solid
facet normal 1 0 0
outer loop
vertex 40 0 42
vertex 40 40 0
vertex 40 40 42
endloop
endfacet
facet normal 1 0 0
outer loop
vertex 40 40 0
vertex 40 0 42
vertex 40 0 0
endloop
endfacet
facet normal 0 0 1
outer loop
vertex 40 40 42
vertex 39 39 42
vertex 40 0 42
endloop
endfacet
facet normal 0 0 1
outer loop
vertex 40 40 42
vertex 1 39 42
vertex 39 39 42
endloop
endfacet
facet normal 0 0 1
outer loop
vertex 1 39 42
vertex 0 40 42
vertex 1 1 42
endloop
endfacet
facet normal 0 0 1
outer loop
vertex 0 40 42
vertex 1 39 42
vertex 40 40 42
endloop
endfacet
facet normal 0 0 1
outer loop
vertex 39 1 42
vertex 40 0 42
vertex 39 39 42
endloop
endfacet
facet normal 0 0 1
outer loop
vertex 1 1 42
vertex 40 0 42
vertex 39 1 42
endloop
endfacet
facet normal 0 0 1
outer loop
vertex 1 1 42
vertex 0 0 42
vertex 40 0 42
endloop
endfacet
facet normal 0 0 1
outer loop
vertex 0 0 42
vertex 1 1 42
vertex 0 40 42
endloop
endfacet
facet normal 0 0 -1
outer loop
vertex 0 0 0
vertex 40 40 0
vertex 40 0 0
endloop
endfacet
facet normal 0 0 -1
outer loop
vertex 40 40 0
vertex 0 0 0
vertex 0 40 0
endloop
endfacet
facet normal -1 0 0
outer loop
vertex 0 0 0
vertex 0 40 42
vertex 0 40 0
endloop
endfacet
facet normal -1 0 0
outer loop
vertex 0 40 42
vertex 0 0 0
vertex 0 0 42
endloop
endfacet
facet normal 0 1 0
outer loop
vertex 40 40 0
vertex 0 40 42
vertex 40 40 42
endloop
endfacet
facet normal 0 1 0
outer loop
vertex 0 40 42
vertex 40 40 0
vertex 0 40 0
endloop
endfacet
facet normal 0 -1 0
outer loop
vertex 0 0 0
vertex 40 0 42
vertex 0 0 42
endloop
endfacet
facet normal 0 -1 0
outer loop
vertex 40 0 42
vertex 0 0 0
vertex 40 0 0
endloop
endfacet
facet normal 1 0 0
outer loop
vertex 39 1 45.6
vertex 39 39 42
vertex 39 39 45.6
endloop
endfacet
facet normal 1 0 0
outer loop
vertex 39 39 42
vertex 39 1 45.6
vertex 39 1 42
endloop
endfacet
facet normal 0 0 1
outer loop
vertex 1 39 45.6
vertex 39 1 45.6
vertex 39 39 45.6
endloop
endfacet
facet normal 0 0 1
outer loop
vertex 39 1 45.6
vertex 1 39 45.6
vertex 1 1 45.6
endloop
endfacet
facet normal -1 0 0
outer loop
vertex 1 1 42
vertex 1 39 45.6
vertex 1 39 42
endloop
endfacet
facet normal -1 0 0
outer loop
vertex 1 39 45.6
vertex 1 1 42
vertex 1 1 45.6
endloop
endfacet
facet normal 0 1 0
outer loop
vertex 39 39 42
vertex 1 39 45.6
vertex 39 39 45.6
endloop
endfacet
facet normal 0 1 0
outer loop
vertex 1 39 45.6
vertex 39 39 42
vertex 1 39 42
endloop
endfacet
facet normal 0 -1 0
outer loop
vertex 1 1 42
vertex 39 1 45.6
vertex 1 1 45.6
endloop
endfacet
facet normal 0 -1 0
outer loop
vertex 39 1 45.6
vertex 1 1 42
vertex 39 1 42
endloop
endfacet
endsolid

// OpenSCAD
// Synthetic test bins for gfladjust's stacking-lip auto-detection.
// Select which fixture to render with:
//   openscad -D 'fixture="with_lip"'     -o with_lip.stl make_lip_fixtures.scad
//   openscad -D 'fixture="no_lip"'       -o no_lip.stl make_lip_fixtures.scad
//   openscad -D 'fixture="coincidental"' -o coincidental.stl make_lip_fixtures.scad
//   openscad -D 'fixture="inner_lip"'    -o inner_lip.stl make_lip_fixtures.scad
//
// These don't reproduce the real Gridfinity lip profile (see
// gfladjust/lip_detect.py's module docstring for the real mechanism --
// an inner-bore shelf, reverse engineered from gridfinity-rebuilt
// -openscad's own source). They only need to exercise the actual
// detector logic: total height modulo the 7mm unit, confirmed by an
// outer-footprint OR inner-bore change near the top.

$fn = 32;

UNIT_HEIGHT = 7;
UNITS = 6;
WALL_HEIGHT = UNITS * UNIT_HEIGHT; // 42
SIZE = 40;

LIP_HEIGHT = 3.6; // within lip_detect's [2.5, 5.0]mm plausible band
LIP_INSET = 1.0;  // outer footprint shrinks by this much (per side) at the top

module plain_box(height) {
    cube([SIZE, SIZE, height], center = false);
}

// A plain box topped with a smaller box -- stands in for a real lip's
// outer-footprint dip near the tip.
module box_with_lip() {
    union() {
        plain_box(WALL_HEIGHT);
        translate([LIP_INSET, LIP_INSET, WALL_HEIGHT])
            cube([SIZE - 2 * LIP_INSET, SIZE - 2 * LIP_INSET, LIP_HEIGHT]);
    }
}

// Same total height as box_with_lip (WALL_HEIGHT + LIP_HEIGHT), but
// flat the entire way -- a legitimate object that happens to land
// within the plausible lip-height remainder band without actually
// having a lip. Regression test for the confirmation check refusing to
// guess rather than mis-cutting a real object.
module box_coincidental_height() {
    plain_box(WALL_HEIGHT + LIP_HEIGHT);
}

// Hollow box whose OUTER footprint never changes at all -- only the
// inner cavity narrows (thicker "wall") for the top LIP_HEIGHT mm.
// Regression fixture for a real bug: a real-world "Field Notes holder"
// bin's lip only shows up in its inner bore, not its outer wall, and an
// outer-only confirmation check missed it entirely (see
// tests/fixtures/lip_regression_corpus/).
WALL_THICK = 2;
LIP_WALL_THICK = 12;
FLOOR = 5;

module hollow_box_with_inner_lip() {
    total_height = WALL_HEIGHT + LIP_HEIGHT;
    difference() {
        cube([SIZE, SIZE, total_height]);
        translate([WALL_THICK, WALL_THICK, FLOOR])
            cube([SIZE - 2 * WALL_THICK, SIZE - 2 * WALL_THICK, WALL_HEIGHT - FLOOR + 0.01]);
        translate([LIP_WALL_THICK, LIP_WALL_THICK, WALL_HEIGHT - 0.01])
            cube([SIZE - 2 * LIP_WALL_THICK, SIZE - 2 * LIP_WALL_THICK, LIP_HEIGHT + 0.02]);
    }
}

fixture = "with_lip";

if (fixture == "no_lip") {
    plain_box(WALL_HEIGHT);
} else if (fixture == "coincidental") {
    box_coincidental_height();
} else if (fixture == "inner_lip") {
    hollow_box_with_inner_lip();
} else {
    box_with_lip();
}
